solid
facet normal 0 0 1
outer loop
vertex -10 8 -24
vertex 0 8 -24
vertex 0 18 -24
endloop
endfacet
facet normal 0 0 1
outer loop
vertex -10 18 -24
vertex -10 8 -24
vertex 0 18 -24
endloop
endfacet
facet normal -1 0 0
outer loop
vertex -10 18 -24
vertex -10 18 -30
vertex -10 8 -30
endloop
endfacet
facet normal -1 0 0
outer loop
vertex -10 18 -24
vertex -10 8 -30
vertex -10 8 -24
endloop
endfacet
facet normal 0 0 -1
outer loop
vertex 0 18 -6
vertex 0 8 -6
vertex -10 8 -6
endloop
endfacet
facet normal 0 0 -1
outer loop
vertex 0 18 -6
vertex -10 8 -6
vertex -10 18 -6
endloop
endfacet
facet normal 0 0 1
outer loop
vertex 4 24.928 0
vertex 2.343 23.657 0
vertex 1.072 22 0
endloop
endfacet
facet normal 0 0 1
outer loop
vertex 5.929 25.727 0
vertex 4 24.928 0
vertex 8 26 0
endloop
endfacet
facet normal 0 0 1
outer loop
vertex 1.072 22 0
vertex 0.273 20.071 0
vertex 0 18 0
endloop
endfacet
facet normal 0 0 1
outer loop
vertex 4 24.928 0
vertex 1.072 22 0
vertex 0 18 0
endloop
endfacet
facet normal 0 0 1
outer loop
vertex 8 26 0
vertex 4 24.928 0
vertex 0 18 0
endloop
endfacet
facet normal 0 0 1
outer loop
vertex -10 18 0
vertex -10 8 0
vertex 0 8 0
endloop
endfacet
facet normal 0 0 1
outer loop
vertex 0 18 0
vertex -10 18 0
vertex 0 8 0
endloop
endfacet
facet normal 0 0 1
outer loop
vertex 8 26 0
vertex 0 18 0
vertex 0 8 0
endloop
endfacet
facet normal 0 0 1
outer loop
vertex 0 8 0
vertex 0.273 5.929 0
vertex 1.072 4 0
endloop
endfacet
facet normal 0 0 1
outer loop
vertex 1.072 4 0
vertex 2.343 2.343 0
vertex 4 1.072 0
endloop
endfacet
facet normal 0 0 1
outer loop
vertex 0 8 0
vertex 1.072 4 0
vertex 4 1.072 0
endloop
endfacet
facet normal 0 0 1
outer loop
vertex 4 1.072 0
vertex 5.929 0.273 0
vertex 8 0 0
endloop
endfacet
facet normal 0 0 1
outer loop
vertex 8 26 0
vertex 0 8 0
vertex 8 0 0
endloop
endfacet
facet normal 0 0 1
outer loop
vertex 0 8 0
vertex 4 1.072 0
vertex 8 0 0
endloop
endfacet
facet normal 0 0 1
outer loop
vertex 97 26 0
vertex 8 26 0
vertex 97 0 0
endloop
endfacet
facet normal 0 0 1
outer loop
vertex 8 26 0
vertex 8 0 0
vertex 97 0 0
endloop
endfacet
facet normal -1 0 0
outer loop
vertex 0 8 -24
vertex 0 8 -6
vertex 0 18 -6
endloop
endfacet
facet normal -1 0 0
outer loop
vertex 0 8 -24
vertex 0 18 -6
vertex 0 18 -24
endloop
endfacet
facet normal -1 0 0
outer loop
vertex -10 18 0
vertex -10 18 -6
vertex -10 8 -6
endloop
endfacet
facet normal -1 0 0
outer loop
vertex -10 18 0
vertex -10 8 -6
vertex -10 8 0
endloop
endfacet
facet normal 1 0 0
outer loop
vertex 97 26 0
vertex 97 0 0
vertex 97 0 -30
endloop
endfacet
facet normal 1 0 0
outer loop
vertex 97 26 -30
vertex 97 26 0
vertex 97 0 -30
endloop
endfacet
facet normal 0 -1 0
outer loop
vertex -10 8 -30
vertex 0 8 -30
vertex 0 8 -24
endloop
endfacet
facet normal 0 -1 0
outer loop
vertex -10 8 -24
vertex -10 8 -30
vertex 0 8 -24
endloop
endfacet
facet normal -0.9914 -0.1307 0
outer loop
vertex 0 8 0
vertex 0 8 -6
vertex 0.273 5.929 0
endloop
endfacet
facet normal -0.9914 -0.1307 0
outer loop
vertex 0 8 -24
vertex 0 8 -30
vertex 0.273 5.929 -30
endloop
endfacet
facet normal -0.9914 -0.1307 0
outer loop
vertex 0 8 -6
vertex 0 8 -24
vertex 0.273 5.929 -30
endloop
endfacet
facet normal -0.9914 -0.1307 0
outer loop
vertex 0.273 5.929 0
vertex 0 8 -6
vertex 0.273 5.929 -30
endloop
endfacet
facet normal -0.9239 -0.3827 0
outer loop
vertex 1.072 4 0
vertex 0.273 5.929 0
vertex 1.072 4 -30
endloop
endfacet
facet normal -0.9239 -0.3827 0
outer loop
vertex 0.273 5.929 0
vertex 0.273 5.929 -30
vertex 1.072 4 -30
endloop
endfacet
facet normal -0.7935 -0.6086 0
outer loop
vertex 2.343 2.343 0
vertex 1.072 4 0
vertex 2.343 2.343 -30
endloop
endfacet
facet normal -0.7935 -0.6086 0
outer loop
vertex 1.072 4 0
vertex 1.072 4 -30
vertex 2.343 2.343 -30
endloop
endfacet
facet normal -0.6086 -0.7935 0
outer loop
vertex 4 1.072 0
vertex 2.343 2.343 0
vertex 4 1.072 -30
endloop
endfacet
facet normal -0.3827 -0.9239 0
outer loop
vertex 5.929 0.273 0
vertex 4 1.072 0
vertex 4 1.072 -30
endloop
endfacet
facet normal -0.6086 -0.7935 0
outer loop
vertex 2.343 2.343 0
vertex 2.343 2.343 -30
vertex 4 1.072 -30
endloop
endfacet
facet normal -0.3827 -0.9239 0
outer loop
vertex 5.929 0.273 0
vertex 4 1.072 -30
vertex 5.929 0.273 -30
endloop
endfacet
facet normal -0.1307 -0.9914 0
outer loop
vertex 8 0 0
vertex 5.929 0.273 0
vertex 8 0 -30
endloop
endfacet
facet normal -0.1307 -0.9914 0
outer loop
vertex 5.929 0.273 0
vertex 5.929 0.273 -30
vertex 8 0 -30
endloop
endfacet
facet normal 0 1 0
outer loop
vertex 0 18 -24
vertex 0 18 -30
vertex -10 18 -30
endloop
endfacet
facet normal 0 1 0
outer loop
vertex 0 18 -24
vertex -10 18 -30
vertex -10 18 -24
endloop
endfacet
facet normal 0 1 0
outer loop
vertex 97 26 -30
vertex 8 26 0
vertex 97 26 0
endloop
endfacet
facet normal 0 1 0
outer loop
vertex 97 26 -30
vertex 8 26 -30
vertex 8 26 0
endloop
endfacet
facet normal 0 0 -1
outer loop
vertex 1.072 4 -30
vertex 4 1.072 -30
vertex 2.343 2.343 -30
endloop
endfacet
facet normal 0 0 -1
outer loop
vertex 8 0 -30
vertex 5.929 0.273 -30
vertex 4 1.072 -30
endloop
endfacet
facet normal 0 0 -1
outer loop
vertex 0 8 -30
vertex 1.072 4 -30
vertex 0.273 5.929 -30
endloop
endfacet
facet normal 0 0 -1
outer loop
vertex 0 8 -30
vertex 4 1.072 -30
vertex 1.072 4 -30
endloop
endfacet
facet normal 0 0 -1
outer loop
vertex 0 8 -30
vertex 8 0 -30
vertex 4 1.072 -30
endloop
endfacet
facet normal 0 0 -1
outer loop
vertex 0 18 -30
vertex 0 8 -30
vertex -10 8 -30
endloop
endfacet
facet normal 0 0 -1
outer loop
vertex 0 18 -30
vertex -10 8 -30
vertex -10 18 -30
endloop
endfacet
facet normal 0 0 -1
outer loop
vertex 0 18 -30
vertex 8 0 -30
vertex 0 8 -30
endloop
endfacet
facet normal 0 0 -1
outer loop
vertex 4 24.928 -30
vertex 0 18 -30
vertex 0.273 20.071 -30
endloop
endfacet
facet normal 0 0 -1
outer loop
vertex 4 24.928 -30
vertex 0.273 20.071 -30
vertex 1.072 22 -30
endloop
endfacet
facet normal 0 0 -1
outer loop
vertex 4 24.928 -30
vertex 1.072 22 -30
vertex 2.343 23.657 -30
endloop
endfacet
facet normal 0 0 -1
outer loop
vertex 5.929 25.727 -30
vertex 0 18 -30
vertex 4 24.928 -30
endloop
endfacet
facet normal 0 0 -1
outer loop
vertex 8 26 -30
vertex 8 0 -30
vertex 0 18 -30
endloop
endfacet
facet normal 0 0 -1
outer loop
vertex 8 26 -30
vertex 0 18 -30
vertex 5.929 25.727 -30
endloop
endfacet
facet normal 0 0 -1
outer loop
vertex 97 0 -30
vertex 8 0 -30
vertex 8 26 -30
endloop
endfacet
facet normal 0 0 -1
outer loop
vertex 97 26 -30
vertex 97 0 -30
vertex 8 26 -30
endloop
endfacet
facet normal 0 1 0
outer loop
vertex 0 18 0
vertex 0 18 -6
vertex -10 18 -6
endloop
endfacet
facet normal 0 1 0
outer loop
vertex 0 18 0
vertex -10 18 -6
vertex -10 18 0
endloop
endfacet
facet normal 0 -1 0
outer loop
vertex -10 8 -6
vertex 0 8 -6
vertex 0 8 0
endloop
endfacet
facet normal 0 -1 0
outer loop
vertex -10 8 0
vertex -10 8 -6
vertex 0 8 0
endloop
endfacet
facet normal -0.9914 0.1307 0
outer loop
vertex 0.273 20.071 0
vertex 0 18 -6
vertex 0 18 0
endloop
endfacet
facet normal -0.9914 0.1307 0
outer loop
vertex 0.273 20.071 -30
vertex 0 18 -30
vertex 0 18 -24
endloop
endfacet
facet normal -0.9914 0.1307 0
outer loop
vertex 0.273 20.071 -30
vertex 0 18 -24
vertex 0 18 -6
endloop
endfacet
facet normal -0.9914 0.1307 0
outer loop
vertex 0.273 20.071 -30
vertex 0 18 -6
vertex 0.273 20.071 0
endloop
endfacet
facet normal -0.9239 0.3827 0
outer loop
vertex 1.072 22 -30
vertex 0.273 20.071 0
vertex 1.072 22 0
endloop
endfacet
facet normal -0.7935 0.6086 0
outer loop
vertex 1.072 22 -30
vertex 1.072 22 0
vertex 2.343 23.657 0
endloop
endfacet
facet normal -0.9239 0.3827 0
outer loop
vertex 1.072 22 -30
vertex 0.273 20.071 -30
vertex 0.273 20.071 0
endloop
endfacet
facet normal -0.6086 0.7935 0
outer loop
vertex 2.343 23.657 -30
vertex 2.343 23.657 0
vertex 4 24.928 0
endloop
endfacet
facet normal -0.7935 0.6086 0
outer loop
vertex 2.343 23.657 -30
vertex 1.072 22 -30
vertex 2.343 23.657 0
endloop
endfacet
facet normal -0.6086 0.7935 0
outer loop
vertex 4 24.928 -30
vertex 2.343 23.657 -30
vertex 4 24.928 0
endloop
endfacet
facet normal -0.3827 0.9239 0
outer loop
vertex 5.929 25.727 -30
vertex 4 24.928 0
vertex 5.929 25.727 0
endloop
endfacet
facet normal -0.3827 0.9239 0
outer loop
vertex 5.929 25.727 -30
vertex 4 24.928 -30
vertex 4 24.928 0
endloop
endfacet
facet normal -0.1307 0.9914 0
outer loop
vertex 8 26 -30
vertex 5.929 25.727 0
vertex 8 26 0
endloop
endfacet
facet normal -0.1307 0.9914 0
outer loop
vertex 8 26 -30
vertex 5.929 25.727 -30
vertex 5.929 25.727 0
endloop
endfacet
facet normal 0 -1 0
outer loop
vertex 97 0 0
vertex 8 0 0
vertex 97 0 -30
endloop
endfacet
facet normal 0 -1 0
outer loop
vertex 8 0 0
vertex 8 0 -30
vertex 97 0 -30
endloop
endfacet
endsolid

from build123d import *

# Parameters (mm, degrees)
SKETCH1_W           = 97
SKETCH1_H           = 30
BOSS_EXTRUDE1_DEPTH = 26
FILLET1_R           = 8
SKETCH2_W           = 6
SKETCH2_H           = 10
BOSS_EXTRUDE2_DEPTH = 10


with BuildPart() as part:
    # Sketch1 → Boss-Extrude1 (new body)
    with BuildSketch(Plane(origin=(0, 0, 0), x_dir=(1, 0, 0), z_dir=(0, 1, 0))):
        with Locations((48.5, 15)):
            Rectangle(SKETCH1_W, SKETCH1_H)
    extrude(amount=BOSS_EXTRUDE1_DEPTH)

    # Fillet1
    fillet1_edges = [part.edges().sort_by_distance(p)[0] for p in [
        (0, 26, -15),
        (0, 0, -15),
    ]]
    fillet(fillet1_edges, radius=FILLET1_R)

    # Sketch2 → Boss-Extrude2 (add)
    with BuildSketch(Plane.ZY):
        with Locations((-27, 13)):
            Rectangle(SKETCH2_W, SKETCH2_H)
        with Locations((-3, 13)):
            Rectangle(SKETCH2_W, SKETCH2_H)
    extrude(amount=BOSS_EXTRUDE2_DEPTH)


solid = part.part
